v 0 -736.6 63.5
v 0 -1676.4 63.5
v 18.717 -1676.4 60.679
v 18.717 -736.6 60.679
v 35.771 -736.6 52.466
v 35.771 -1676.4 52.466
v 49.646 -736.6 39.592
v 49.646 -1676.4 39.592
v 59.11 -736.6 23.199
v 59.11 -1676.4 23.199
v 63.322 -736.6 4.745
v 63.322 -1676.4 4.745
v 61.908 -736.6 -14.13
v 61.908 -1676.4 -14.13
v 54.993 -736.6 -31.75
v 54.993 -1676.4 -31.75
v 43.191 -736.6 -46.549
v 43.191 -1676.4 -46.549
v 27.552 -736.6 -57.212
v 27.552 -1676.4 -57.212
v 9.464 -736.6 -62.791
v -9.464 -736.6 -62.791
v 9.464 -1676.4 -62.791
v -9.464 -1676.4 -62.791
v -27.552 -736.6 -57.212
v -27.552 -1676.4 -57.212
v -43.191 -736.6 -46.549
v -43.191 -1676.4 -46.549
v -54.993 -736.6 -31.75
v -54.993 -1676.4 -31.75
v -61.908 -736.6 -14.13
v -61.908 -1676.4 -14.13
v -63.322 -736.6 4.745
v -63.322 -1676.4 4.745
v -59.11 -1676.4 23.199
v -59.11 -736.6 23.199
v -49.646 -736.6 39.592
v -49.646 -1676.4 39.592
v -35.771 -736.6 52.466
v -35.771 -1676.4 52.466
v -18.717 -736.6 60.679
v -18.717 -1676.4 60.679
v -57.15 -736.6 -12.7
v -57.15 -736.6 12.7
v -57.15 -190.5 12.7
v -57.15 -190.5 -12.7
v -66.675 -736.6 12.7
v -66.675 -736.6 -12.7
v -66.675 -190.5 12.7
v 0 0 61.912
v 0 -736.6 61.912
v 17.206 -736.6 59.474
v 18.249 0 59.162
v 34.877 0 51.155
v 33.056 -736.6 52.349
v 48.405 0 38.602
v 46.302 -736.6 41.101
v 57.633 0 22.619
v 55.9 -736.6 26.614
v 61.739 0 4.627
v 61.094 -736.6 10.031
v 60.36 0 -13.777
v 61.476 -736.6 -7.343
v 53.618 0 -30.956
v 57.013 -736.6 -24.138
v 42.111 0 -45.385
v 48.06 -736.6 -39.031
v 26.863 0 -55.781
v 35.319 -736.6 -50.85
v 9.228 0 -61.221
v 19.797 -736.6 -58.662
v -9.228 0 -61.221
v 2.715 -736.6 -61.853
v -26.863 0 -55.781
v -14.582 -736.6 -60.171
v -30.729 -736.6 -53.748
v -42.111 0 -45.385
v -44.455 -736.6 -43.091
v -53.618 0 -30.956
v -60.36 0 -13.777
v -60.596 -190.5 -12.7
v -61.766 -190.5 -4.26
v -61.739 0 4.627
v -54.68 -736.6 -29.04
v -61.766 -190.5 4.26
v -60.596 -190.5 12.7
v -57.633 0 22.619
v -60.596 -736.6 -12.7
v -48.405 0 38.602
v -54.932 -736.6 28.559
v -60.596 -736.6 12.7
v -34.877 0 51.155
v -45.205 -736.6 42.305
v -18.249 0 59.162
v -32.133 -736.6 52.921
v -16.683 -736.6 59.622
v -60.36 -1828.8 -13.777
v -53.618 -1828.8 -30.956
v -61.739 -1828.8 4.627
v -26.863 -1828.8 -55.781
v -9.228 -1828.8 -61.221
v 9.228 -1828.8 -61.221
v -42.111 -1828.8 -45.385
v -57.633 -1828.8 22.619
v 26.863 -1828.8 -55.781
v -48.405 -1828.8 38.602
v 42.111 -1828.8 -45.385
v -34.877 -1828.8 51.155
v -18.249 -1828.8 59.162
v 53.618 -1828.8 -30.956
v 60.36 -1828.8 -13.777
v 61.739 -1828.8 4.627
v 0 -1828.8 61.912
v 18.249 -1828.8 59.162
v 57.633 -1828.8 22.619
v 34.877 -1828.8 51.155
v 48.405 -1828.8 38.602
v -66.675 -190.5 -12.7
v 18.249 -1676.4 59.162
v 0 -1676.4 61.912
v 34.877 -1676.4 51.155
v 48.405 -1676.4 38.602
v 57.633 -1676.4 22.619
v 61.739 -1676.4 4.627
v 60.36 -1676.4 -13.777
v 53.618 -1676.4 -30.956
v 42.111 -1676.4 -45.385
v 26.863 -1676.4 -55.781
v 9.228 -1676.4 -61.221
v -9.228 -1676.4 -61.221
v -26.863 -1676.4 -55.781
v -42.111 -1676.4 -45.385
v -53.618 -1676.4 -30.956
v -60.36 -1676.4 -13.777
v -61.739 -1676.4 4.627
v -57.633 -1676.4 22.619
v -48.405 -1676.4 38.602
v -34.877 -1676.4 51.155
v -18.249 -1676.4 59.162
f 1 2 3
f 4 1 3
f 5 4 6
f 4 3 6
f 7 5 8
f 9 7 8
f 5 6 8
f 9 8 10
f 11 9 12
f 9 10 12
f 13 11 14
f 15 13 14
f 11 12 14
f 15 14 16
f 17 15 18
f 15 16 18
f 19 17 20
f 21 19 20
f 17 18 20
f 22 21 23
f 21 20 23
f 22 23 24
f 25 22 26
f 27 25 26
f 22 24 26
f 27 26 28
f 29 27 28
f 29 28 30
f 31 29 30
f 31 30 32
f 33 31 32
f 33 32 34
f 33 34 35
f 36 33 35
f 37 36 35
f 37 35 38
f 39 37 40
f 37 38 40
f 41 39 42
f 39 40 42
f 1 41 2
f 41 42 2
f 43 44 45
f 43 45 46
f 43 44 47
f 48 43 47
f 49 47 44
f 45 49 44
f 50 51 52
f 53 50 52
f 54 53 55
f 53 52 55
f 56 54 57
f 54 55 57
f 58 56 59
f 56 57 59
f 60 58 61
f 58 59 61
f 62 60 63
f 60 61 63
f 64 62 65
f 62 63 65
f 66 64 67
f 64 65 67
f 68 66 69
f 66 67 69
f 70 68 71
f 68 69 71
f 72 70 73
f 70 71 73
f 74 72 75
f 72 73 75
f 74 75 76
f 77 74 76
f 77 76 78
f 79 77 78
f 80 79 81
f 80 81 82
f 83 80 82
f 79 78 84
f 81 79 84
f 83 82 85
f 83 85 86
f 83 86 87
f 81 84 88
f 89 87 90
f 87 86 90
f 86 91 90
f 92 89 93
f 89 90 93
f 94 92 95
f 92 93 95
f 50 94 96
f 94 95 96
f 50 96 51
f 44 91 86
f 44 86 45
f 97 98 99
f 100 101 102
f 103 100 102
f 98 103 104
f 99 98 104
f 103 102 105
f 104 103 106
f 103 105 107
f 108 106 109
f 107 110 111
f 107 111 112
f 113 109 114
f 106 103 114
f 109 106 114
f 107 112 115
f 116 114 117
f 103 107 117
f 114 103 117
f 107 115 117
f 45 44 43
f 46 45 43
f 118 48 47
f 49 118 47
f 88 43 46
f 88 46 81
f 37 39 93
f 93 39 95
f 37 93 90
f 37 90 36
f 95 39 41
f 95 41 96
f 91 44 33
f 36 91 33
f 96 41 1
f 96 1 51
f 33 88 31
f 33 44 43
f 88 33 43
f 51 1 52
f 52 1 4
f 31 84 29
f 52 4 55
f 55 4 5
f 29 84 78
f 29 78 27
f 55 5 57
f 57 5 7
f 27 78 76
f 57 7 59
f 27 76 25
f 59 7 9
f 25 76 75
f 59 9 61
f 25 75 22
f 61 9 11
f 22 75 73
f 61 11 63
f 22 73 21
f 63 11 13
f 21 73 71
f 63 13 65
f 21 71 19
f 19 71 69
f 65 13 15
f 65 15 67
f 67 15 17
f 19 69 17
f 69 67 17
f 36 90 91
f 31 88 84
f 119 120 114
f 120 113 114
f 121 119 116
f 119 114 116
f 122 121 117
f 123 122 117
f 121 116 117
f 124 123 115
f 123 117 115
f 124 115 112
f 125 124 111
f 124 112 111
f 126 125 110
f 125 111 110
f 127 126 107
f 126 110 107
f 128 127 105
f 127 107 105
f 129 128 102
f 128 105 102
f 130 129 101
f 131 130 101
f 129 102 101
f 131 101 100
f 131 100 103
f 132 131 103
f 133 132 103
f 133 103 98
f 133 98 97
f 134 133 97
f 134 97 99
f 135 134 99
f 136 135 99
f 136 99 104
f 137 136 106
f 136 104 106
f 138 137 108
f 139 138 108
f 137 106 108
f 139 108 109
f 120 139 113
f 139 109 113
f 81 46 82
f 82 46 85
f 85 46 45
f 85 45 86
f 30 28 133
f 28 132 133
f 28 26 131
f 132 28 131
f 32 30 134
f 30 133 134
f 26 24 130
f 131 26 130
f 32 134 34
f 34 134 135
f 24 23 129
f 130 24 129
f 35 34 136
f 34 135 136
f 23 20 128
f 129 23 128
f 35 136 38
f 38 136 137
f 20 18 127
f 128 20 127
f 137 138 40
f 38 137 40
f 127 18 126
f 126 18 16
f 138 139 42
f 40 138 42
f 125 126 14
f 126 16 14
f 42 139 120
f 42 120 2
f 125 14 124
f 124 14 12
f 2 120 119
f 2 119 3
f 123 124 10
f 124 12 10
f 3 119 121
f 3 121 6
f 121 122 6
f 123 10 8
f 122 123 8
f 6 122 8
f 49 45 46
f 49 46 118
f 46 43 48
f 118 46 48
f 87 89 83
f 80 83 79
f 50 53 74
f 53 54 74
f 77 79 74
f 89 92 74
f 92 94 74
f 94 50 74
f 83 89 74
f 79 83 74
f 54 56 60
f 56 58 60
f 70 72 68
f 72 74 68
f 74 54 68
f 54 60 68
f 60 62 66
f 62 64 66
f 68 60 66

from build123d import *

# Parameters (mm, degrees)
F3_DEPTH = 546.1
F4_DEPTH = 546.1


with BuildPart() as f1:
    # F0 (on Right) → F1 (revolve)
    with BuildSketch(Plane.YZ):
        Polygon((-1828.8, 0), (0, 0), (0, 61.9125), (-736.6, 61.9125), (-736.6, 63.5), (-1676.4, 63.5), (-1676.4, 61.9125), (-1828.8, 61.9125), align=None)
    revolve(axis=Axis((0, 13.9595033184, 0), (0, 1, 0)))

    # F2 (on face) → F3 (cut)
    with BuildSketch(Plane(origin=(0, -736.6, 0), x_dir=(-1, 0, 0), z_dir=(0, 1, 0))):
        with BuildLine():
            Line((60.5959376217, 12.7), (57.15, 12.7))
            Line((57.15, 12.7), (57.15, -12.7))
            Line((57.15, -12.7), (60.5959376217, -12.7))
            ThreePointArc((60.5959376217, -12.7), (61.5824798309, -6.3840296149), (61.9125, 0))
            ThreePointArc((61.9125, 0), (61.5824798309, 6.3840296149), (60.5959376217, 12.7))
        make_face()
        with BuildLine():
            Line((62.2170394667, 12.7), (60.5959376217, 12.7))
            ThreePointArc((60.5959376217, 12.7), (61.5824798309, 6.3840296149), (61.9125, 0))
            ThreePointArc((61.9125, 0), (61.5824798309, -6.3840296149), (60.5959376217, -12.7))
            Line((60.5959376217, -12.7), (62.2170394667, -12.7))
            ThreePointArc((62.2170394667, -12.7), (63.1784457158, -6.3823190873), (63.5, 0))
            ThreePointArc((63.5, 0), (63.1784457158, 6.3823190873), (62.2170394667, 12.7))
        make_face()
        with BuildLine():
            Line((66.675, 12.7), (62.2170394667, 12.7))
            ThreePointArc((62.2170394667, 12.7), (63.1784457158, 6.3823190873), (63.5, 0))
            ThreePointArc((63.5, 0), (63.1784457158, -6.3823190873), (62.2170394667, -12.7))
            Line((62.2170394667, -12.7), (66.675, -12.7))
            Line((66.675, -12.7), (66.675, 12.7))
        make_face()
    extrude(amount=F3_DEPTH, mode=Mode.SUBTRACT)


with BuildPart() as f4:
    # F2 (on face) → F4 (new body)
    with BuildSketch(Plane(origin=(0, -736.6, 0), x_dir=(-1, 0, 0), z_dir=(0, 1, 0))):
        with BuildLine():
            Line((66.675, 12.7), (62.2170394667, 12.7))
            ThreePointArc((62.2170394667, 12.7), (63.1784457158, 6.3823190873), (63.5, 0))
            ThreePointArc((63.5, 0), (63.1784457158, -6.3823190873), (62.2170394667, -12.7))
            Line((62.2170394667, -12.7), (66.675, -12.7))
            Line((66.675, -12.7), (66.675, 12.7))
        make_face()
        with BuildLine():
            Line((60.5959376217, 12.7), (57.15, 12.7))
            Line((57.15, 12.7), (57.15, -12.7))
            Line((57.15, -12.7), (60.5959376217, -12.7))
            ThreePointArc((60.5959376217, -12.7), (61.5824798309, -6.3840296149), (61.9125, 0))
            ThreePointArc((61.9125, 0), (61.5824798309, 6.3840296149), (60.5959376217, 12.7))
        make_face()
        with BuildLine():
            Line((62.2170394667, 12.7), (60.5959376217, 12.7))
            ThreePointArc((60.5959376217, 12.7), (61.5824798309, 6.3840296149), (61.9125, 0))
            ThreePointArc((61.9125, 0), (61.5824798309, -6.3840296149), (60.5959376217, -12.7))
            Line((60.5959376217, -12.7), (62.2170394667, -12.7))
            ThreePointArc((62.2170394667, -12.7), (63.1784457158, -6.3823190873), (63.5, 0))
            ThreePointArc((63.5, 0), (63.1784457158, 6.3823190873), (62.2170394667, 12.7))
        make_face()
    extrude(amount=F4_DEPTH)


solid = Compound([f1.part, f4.part])
